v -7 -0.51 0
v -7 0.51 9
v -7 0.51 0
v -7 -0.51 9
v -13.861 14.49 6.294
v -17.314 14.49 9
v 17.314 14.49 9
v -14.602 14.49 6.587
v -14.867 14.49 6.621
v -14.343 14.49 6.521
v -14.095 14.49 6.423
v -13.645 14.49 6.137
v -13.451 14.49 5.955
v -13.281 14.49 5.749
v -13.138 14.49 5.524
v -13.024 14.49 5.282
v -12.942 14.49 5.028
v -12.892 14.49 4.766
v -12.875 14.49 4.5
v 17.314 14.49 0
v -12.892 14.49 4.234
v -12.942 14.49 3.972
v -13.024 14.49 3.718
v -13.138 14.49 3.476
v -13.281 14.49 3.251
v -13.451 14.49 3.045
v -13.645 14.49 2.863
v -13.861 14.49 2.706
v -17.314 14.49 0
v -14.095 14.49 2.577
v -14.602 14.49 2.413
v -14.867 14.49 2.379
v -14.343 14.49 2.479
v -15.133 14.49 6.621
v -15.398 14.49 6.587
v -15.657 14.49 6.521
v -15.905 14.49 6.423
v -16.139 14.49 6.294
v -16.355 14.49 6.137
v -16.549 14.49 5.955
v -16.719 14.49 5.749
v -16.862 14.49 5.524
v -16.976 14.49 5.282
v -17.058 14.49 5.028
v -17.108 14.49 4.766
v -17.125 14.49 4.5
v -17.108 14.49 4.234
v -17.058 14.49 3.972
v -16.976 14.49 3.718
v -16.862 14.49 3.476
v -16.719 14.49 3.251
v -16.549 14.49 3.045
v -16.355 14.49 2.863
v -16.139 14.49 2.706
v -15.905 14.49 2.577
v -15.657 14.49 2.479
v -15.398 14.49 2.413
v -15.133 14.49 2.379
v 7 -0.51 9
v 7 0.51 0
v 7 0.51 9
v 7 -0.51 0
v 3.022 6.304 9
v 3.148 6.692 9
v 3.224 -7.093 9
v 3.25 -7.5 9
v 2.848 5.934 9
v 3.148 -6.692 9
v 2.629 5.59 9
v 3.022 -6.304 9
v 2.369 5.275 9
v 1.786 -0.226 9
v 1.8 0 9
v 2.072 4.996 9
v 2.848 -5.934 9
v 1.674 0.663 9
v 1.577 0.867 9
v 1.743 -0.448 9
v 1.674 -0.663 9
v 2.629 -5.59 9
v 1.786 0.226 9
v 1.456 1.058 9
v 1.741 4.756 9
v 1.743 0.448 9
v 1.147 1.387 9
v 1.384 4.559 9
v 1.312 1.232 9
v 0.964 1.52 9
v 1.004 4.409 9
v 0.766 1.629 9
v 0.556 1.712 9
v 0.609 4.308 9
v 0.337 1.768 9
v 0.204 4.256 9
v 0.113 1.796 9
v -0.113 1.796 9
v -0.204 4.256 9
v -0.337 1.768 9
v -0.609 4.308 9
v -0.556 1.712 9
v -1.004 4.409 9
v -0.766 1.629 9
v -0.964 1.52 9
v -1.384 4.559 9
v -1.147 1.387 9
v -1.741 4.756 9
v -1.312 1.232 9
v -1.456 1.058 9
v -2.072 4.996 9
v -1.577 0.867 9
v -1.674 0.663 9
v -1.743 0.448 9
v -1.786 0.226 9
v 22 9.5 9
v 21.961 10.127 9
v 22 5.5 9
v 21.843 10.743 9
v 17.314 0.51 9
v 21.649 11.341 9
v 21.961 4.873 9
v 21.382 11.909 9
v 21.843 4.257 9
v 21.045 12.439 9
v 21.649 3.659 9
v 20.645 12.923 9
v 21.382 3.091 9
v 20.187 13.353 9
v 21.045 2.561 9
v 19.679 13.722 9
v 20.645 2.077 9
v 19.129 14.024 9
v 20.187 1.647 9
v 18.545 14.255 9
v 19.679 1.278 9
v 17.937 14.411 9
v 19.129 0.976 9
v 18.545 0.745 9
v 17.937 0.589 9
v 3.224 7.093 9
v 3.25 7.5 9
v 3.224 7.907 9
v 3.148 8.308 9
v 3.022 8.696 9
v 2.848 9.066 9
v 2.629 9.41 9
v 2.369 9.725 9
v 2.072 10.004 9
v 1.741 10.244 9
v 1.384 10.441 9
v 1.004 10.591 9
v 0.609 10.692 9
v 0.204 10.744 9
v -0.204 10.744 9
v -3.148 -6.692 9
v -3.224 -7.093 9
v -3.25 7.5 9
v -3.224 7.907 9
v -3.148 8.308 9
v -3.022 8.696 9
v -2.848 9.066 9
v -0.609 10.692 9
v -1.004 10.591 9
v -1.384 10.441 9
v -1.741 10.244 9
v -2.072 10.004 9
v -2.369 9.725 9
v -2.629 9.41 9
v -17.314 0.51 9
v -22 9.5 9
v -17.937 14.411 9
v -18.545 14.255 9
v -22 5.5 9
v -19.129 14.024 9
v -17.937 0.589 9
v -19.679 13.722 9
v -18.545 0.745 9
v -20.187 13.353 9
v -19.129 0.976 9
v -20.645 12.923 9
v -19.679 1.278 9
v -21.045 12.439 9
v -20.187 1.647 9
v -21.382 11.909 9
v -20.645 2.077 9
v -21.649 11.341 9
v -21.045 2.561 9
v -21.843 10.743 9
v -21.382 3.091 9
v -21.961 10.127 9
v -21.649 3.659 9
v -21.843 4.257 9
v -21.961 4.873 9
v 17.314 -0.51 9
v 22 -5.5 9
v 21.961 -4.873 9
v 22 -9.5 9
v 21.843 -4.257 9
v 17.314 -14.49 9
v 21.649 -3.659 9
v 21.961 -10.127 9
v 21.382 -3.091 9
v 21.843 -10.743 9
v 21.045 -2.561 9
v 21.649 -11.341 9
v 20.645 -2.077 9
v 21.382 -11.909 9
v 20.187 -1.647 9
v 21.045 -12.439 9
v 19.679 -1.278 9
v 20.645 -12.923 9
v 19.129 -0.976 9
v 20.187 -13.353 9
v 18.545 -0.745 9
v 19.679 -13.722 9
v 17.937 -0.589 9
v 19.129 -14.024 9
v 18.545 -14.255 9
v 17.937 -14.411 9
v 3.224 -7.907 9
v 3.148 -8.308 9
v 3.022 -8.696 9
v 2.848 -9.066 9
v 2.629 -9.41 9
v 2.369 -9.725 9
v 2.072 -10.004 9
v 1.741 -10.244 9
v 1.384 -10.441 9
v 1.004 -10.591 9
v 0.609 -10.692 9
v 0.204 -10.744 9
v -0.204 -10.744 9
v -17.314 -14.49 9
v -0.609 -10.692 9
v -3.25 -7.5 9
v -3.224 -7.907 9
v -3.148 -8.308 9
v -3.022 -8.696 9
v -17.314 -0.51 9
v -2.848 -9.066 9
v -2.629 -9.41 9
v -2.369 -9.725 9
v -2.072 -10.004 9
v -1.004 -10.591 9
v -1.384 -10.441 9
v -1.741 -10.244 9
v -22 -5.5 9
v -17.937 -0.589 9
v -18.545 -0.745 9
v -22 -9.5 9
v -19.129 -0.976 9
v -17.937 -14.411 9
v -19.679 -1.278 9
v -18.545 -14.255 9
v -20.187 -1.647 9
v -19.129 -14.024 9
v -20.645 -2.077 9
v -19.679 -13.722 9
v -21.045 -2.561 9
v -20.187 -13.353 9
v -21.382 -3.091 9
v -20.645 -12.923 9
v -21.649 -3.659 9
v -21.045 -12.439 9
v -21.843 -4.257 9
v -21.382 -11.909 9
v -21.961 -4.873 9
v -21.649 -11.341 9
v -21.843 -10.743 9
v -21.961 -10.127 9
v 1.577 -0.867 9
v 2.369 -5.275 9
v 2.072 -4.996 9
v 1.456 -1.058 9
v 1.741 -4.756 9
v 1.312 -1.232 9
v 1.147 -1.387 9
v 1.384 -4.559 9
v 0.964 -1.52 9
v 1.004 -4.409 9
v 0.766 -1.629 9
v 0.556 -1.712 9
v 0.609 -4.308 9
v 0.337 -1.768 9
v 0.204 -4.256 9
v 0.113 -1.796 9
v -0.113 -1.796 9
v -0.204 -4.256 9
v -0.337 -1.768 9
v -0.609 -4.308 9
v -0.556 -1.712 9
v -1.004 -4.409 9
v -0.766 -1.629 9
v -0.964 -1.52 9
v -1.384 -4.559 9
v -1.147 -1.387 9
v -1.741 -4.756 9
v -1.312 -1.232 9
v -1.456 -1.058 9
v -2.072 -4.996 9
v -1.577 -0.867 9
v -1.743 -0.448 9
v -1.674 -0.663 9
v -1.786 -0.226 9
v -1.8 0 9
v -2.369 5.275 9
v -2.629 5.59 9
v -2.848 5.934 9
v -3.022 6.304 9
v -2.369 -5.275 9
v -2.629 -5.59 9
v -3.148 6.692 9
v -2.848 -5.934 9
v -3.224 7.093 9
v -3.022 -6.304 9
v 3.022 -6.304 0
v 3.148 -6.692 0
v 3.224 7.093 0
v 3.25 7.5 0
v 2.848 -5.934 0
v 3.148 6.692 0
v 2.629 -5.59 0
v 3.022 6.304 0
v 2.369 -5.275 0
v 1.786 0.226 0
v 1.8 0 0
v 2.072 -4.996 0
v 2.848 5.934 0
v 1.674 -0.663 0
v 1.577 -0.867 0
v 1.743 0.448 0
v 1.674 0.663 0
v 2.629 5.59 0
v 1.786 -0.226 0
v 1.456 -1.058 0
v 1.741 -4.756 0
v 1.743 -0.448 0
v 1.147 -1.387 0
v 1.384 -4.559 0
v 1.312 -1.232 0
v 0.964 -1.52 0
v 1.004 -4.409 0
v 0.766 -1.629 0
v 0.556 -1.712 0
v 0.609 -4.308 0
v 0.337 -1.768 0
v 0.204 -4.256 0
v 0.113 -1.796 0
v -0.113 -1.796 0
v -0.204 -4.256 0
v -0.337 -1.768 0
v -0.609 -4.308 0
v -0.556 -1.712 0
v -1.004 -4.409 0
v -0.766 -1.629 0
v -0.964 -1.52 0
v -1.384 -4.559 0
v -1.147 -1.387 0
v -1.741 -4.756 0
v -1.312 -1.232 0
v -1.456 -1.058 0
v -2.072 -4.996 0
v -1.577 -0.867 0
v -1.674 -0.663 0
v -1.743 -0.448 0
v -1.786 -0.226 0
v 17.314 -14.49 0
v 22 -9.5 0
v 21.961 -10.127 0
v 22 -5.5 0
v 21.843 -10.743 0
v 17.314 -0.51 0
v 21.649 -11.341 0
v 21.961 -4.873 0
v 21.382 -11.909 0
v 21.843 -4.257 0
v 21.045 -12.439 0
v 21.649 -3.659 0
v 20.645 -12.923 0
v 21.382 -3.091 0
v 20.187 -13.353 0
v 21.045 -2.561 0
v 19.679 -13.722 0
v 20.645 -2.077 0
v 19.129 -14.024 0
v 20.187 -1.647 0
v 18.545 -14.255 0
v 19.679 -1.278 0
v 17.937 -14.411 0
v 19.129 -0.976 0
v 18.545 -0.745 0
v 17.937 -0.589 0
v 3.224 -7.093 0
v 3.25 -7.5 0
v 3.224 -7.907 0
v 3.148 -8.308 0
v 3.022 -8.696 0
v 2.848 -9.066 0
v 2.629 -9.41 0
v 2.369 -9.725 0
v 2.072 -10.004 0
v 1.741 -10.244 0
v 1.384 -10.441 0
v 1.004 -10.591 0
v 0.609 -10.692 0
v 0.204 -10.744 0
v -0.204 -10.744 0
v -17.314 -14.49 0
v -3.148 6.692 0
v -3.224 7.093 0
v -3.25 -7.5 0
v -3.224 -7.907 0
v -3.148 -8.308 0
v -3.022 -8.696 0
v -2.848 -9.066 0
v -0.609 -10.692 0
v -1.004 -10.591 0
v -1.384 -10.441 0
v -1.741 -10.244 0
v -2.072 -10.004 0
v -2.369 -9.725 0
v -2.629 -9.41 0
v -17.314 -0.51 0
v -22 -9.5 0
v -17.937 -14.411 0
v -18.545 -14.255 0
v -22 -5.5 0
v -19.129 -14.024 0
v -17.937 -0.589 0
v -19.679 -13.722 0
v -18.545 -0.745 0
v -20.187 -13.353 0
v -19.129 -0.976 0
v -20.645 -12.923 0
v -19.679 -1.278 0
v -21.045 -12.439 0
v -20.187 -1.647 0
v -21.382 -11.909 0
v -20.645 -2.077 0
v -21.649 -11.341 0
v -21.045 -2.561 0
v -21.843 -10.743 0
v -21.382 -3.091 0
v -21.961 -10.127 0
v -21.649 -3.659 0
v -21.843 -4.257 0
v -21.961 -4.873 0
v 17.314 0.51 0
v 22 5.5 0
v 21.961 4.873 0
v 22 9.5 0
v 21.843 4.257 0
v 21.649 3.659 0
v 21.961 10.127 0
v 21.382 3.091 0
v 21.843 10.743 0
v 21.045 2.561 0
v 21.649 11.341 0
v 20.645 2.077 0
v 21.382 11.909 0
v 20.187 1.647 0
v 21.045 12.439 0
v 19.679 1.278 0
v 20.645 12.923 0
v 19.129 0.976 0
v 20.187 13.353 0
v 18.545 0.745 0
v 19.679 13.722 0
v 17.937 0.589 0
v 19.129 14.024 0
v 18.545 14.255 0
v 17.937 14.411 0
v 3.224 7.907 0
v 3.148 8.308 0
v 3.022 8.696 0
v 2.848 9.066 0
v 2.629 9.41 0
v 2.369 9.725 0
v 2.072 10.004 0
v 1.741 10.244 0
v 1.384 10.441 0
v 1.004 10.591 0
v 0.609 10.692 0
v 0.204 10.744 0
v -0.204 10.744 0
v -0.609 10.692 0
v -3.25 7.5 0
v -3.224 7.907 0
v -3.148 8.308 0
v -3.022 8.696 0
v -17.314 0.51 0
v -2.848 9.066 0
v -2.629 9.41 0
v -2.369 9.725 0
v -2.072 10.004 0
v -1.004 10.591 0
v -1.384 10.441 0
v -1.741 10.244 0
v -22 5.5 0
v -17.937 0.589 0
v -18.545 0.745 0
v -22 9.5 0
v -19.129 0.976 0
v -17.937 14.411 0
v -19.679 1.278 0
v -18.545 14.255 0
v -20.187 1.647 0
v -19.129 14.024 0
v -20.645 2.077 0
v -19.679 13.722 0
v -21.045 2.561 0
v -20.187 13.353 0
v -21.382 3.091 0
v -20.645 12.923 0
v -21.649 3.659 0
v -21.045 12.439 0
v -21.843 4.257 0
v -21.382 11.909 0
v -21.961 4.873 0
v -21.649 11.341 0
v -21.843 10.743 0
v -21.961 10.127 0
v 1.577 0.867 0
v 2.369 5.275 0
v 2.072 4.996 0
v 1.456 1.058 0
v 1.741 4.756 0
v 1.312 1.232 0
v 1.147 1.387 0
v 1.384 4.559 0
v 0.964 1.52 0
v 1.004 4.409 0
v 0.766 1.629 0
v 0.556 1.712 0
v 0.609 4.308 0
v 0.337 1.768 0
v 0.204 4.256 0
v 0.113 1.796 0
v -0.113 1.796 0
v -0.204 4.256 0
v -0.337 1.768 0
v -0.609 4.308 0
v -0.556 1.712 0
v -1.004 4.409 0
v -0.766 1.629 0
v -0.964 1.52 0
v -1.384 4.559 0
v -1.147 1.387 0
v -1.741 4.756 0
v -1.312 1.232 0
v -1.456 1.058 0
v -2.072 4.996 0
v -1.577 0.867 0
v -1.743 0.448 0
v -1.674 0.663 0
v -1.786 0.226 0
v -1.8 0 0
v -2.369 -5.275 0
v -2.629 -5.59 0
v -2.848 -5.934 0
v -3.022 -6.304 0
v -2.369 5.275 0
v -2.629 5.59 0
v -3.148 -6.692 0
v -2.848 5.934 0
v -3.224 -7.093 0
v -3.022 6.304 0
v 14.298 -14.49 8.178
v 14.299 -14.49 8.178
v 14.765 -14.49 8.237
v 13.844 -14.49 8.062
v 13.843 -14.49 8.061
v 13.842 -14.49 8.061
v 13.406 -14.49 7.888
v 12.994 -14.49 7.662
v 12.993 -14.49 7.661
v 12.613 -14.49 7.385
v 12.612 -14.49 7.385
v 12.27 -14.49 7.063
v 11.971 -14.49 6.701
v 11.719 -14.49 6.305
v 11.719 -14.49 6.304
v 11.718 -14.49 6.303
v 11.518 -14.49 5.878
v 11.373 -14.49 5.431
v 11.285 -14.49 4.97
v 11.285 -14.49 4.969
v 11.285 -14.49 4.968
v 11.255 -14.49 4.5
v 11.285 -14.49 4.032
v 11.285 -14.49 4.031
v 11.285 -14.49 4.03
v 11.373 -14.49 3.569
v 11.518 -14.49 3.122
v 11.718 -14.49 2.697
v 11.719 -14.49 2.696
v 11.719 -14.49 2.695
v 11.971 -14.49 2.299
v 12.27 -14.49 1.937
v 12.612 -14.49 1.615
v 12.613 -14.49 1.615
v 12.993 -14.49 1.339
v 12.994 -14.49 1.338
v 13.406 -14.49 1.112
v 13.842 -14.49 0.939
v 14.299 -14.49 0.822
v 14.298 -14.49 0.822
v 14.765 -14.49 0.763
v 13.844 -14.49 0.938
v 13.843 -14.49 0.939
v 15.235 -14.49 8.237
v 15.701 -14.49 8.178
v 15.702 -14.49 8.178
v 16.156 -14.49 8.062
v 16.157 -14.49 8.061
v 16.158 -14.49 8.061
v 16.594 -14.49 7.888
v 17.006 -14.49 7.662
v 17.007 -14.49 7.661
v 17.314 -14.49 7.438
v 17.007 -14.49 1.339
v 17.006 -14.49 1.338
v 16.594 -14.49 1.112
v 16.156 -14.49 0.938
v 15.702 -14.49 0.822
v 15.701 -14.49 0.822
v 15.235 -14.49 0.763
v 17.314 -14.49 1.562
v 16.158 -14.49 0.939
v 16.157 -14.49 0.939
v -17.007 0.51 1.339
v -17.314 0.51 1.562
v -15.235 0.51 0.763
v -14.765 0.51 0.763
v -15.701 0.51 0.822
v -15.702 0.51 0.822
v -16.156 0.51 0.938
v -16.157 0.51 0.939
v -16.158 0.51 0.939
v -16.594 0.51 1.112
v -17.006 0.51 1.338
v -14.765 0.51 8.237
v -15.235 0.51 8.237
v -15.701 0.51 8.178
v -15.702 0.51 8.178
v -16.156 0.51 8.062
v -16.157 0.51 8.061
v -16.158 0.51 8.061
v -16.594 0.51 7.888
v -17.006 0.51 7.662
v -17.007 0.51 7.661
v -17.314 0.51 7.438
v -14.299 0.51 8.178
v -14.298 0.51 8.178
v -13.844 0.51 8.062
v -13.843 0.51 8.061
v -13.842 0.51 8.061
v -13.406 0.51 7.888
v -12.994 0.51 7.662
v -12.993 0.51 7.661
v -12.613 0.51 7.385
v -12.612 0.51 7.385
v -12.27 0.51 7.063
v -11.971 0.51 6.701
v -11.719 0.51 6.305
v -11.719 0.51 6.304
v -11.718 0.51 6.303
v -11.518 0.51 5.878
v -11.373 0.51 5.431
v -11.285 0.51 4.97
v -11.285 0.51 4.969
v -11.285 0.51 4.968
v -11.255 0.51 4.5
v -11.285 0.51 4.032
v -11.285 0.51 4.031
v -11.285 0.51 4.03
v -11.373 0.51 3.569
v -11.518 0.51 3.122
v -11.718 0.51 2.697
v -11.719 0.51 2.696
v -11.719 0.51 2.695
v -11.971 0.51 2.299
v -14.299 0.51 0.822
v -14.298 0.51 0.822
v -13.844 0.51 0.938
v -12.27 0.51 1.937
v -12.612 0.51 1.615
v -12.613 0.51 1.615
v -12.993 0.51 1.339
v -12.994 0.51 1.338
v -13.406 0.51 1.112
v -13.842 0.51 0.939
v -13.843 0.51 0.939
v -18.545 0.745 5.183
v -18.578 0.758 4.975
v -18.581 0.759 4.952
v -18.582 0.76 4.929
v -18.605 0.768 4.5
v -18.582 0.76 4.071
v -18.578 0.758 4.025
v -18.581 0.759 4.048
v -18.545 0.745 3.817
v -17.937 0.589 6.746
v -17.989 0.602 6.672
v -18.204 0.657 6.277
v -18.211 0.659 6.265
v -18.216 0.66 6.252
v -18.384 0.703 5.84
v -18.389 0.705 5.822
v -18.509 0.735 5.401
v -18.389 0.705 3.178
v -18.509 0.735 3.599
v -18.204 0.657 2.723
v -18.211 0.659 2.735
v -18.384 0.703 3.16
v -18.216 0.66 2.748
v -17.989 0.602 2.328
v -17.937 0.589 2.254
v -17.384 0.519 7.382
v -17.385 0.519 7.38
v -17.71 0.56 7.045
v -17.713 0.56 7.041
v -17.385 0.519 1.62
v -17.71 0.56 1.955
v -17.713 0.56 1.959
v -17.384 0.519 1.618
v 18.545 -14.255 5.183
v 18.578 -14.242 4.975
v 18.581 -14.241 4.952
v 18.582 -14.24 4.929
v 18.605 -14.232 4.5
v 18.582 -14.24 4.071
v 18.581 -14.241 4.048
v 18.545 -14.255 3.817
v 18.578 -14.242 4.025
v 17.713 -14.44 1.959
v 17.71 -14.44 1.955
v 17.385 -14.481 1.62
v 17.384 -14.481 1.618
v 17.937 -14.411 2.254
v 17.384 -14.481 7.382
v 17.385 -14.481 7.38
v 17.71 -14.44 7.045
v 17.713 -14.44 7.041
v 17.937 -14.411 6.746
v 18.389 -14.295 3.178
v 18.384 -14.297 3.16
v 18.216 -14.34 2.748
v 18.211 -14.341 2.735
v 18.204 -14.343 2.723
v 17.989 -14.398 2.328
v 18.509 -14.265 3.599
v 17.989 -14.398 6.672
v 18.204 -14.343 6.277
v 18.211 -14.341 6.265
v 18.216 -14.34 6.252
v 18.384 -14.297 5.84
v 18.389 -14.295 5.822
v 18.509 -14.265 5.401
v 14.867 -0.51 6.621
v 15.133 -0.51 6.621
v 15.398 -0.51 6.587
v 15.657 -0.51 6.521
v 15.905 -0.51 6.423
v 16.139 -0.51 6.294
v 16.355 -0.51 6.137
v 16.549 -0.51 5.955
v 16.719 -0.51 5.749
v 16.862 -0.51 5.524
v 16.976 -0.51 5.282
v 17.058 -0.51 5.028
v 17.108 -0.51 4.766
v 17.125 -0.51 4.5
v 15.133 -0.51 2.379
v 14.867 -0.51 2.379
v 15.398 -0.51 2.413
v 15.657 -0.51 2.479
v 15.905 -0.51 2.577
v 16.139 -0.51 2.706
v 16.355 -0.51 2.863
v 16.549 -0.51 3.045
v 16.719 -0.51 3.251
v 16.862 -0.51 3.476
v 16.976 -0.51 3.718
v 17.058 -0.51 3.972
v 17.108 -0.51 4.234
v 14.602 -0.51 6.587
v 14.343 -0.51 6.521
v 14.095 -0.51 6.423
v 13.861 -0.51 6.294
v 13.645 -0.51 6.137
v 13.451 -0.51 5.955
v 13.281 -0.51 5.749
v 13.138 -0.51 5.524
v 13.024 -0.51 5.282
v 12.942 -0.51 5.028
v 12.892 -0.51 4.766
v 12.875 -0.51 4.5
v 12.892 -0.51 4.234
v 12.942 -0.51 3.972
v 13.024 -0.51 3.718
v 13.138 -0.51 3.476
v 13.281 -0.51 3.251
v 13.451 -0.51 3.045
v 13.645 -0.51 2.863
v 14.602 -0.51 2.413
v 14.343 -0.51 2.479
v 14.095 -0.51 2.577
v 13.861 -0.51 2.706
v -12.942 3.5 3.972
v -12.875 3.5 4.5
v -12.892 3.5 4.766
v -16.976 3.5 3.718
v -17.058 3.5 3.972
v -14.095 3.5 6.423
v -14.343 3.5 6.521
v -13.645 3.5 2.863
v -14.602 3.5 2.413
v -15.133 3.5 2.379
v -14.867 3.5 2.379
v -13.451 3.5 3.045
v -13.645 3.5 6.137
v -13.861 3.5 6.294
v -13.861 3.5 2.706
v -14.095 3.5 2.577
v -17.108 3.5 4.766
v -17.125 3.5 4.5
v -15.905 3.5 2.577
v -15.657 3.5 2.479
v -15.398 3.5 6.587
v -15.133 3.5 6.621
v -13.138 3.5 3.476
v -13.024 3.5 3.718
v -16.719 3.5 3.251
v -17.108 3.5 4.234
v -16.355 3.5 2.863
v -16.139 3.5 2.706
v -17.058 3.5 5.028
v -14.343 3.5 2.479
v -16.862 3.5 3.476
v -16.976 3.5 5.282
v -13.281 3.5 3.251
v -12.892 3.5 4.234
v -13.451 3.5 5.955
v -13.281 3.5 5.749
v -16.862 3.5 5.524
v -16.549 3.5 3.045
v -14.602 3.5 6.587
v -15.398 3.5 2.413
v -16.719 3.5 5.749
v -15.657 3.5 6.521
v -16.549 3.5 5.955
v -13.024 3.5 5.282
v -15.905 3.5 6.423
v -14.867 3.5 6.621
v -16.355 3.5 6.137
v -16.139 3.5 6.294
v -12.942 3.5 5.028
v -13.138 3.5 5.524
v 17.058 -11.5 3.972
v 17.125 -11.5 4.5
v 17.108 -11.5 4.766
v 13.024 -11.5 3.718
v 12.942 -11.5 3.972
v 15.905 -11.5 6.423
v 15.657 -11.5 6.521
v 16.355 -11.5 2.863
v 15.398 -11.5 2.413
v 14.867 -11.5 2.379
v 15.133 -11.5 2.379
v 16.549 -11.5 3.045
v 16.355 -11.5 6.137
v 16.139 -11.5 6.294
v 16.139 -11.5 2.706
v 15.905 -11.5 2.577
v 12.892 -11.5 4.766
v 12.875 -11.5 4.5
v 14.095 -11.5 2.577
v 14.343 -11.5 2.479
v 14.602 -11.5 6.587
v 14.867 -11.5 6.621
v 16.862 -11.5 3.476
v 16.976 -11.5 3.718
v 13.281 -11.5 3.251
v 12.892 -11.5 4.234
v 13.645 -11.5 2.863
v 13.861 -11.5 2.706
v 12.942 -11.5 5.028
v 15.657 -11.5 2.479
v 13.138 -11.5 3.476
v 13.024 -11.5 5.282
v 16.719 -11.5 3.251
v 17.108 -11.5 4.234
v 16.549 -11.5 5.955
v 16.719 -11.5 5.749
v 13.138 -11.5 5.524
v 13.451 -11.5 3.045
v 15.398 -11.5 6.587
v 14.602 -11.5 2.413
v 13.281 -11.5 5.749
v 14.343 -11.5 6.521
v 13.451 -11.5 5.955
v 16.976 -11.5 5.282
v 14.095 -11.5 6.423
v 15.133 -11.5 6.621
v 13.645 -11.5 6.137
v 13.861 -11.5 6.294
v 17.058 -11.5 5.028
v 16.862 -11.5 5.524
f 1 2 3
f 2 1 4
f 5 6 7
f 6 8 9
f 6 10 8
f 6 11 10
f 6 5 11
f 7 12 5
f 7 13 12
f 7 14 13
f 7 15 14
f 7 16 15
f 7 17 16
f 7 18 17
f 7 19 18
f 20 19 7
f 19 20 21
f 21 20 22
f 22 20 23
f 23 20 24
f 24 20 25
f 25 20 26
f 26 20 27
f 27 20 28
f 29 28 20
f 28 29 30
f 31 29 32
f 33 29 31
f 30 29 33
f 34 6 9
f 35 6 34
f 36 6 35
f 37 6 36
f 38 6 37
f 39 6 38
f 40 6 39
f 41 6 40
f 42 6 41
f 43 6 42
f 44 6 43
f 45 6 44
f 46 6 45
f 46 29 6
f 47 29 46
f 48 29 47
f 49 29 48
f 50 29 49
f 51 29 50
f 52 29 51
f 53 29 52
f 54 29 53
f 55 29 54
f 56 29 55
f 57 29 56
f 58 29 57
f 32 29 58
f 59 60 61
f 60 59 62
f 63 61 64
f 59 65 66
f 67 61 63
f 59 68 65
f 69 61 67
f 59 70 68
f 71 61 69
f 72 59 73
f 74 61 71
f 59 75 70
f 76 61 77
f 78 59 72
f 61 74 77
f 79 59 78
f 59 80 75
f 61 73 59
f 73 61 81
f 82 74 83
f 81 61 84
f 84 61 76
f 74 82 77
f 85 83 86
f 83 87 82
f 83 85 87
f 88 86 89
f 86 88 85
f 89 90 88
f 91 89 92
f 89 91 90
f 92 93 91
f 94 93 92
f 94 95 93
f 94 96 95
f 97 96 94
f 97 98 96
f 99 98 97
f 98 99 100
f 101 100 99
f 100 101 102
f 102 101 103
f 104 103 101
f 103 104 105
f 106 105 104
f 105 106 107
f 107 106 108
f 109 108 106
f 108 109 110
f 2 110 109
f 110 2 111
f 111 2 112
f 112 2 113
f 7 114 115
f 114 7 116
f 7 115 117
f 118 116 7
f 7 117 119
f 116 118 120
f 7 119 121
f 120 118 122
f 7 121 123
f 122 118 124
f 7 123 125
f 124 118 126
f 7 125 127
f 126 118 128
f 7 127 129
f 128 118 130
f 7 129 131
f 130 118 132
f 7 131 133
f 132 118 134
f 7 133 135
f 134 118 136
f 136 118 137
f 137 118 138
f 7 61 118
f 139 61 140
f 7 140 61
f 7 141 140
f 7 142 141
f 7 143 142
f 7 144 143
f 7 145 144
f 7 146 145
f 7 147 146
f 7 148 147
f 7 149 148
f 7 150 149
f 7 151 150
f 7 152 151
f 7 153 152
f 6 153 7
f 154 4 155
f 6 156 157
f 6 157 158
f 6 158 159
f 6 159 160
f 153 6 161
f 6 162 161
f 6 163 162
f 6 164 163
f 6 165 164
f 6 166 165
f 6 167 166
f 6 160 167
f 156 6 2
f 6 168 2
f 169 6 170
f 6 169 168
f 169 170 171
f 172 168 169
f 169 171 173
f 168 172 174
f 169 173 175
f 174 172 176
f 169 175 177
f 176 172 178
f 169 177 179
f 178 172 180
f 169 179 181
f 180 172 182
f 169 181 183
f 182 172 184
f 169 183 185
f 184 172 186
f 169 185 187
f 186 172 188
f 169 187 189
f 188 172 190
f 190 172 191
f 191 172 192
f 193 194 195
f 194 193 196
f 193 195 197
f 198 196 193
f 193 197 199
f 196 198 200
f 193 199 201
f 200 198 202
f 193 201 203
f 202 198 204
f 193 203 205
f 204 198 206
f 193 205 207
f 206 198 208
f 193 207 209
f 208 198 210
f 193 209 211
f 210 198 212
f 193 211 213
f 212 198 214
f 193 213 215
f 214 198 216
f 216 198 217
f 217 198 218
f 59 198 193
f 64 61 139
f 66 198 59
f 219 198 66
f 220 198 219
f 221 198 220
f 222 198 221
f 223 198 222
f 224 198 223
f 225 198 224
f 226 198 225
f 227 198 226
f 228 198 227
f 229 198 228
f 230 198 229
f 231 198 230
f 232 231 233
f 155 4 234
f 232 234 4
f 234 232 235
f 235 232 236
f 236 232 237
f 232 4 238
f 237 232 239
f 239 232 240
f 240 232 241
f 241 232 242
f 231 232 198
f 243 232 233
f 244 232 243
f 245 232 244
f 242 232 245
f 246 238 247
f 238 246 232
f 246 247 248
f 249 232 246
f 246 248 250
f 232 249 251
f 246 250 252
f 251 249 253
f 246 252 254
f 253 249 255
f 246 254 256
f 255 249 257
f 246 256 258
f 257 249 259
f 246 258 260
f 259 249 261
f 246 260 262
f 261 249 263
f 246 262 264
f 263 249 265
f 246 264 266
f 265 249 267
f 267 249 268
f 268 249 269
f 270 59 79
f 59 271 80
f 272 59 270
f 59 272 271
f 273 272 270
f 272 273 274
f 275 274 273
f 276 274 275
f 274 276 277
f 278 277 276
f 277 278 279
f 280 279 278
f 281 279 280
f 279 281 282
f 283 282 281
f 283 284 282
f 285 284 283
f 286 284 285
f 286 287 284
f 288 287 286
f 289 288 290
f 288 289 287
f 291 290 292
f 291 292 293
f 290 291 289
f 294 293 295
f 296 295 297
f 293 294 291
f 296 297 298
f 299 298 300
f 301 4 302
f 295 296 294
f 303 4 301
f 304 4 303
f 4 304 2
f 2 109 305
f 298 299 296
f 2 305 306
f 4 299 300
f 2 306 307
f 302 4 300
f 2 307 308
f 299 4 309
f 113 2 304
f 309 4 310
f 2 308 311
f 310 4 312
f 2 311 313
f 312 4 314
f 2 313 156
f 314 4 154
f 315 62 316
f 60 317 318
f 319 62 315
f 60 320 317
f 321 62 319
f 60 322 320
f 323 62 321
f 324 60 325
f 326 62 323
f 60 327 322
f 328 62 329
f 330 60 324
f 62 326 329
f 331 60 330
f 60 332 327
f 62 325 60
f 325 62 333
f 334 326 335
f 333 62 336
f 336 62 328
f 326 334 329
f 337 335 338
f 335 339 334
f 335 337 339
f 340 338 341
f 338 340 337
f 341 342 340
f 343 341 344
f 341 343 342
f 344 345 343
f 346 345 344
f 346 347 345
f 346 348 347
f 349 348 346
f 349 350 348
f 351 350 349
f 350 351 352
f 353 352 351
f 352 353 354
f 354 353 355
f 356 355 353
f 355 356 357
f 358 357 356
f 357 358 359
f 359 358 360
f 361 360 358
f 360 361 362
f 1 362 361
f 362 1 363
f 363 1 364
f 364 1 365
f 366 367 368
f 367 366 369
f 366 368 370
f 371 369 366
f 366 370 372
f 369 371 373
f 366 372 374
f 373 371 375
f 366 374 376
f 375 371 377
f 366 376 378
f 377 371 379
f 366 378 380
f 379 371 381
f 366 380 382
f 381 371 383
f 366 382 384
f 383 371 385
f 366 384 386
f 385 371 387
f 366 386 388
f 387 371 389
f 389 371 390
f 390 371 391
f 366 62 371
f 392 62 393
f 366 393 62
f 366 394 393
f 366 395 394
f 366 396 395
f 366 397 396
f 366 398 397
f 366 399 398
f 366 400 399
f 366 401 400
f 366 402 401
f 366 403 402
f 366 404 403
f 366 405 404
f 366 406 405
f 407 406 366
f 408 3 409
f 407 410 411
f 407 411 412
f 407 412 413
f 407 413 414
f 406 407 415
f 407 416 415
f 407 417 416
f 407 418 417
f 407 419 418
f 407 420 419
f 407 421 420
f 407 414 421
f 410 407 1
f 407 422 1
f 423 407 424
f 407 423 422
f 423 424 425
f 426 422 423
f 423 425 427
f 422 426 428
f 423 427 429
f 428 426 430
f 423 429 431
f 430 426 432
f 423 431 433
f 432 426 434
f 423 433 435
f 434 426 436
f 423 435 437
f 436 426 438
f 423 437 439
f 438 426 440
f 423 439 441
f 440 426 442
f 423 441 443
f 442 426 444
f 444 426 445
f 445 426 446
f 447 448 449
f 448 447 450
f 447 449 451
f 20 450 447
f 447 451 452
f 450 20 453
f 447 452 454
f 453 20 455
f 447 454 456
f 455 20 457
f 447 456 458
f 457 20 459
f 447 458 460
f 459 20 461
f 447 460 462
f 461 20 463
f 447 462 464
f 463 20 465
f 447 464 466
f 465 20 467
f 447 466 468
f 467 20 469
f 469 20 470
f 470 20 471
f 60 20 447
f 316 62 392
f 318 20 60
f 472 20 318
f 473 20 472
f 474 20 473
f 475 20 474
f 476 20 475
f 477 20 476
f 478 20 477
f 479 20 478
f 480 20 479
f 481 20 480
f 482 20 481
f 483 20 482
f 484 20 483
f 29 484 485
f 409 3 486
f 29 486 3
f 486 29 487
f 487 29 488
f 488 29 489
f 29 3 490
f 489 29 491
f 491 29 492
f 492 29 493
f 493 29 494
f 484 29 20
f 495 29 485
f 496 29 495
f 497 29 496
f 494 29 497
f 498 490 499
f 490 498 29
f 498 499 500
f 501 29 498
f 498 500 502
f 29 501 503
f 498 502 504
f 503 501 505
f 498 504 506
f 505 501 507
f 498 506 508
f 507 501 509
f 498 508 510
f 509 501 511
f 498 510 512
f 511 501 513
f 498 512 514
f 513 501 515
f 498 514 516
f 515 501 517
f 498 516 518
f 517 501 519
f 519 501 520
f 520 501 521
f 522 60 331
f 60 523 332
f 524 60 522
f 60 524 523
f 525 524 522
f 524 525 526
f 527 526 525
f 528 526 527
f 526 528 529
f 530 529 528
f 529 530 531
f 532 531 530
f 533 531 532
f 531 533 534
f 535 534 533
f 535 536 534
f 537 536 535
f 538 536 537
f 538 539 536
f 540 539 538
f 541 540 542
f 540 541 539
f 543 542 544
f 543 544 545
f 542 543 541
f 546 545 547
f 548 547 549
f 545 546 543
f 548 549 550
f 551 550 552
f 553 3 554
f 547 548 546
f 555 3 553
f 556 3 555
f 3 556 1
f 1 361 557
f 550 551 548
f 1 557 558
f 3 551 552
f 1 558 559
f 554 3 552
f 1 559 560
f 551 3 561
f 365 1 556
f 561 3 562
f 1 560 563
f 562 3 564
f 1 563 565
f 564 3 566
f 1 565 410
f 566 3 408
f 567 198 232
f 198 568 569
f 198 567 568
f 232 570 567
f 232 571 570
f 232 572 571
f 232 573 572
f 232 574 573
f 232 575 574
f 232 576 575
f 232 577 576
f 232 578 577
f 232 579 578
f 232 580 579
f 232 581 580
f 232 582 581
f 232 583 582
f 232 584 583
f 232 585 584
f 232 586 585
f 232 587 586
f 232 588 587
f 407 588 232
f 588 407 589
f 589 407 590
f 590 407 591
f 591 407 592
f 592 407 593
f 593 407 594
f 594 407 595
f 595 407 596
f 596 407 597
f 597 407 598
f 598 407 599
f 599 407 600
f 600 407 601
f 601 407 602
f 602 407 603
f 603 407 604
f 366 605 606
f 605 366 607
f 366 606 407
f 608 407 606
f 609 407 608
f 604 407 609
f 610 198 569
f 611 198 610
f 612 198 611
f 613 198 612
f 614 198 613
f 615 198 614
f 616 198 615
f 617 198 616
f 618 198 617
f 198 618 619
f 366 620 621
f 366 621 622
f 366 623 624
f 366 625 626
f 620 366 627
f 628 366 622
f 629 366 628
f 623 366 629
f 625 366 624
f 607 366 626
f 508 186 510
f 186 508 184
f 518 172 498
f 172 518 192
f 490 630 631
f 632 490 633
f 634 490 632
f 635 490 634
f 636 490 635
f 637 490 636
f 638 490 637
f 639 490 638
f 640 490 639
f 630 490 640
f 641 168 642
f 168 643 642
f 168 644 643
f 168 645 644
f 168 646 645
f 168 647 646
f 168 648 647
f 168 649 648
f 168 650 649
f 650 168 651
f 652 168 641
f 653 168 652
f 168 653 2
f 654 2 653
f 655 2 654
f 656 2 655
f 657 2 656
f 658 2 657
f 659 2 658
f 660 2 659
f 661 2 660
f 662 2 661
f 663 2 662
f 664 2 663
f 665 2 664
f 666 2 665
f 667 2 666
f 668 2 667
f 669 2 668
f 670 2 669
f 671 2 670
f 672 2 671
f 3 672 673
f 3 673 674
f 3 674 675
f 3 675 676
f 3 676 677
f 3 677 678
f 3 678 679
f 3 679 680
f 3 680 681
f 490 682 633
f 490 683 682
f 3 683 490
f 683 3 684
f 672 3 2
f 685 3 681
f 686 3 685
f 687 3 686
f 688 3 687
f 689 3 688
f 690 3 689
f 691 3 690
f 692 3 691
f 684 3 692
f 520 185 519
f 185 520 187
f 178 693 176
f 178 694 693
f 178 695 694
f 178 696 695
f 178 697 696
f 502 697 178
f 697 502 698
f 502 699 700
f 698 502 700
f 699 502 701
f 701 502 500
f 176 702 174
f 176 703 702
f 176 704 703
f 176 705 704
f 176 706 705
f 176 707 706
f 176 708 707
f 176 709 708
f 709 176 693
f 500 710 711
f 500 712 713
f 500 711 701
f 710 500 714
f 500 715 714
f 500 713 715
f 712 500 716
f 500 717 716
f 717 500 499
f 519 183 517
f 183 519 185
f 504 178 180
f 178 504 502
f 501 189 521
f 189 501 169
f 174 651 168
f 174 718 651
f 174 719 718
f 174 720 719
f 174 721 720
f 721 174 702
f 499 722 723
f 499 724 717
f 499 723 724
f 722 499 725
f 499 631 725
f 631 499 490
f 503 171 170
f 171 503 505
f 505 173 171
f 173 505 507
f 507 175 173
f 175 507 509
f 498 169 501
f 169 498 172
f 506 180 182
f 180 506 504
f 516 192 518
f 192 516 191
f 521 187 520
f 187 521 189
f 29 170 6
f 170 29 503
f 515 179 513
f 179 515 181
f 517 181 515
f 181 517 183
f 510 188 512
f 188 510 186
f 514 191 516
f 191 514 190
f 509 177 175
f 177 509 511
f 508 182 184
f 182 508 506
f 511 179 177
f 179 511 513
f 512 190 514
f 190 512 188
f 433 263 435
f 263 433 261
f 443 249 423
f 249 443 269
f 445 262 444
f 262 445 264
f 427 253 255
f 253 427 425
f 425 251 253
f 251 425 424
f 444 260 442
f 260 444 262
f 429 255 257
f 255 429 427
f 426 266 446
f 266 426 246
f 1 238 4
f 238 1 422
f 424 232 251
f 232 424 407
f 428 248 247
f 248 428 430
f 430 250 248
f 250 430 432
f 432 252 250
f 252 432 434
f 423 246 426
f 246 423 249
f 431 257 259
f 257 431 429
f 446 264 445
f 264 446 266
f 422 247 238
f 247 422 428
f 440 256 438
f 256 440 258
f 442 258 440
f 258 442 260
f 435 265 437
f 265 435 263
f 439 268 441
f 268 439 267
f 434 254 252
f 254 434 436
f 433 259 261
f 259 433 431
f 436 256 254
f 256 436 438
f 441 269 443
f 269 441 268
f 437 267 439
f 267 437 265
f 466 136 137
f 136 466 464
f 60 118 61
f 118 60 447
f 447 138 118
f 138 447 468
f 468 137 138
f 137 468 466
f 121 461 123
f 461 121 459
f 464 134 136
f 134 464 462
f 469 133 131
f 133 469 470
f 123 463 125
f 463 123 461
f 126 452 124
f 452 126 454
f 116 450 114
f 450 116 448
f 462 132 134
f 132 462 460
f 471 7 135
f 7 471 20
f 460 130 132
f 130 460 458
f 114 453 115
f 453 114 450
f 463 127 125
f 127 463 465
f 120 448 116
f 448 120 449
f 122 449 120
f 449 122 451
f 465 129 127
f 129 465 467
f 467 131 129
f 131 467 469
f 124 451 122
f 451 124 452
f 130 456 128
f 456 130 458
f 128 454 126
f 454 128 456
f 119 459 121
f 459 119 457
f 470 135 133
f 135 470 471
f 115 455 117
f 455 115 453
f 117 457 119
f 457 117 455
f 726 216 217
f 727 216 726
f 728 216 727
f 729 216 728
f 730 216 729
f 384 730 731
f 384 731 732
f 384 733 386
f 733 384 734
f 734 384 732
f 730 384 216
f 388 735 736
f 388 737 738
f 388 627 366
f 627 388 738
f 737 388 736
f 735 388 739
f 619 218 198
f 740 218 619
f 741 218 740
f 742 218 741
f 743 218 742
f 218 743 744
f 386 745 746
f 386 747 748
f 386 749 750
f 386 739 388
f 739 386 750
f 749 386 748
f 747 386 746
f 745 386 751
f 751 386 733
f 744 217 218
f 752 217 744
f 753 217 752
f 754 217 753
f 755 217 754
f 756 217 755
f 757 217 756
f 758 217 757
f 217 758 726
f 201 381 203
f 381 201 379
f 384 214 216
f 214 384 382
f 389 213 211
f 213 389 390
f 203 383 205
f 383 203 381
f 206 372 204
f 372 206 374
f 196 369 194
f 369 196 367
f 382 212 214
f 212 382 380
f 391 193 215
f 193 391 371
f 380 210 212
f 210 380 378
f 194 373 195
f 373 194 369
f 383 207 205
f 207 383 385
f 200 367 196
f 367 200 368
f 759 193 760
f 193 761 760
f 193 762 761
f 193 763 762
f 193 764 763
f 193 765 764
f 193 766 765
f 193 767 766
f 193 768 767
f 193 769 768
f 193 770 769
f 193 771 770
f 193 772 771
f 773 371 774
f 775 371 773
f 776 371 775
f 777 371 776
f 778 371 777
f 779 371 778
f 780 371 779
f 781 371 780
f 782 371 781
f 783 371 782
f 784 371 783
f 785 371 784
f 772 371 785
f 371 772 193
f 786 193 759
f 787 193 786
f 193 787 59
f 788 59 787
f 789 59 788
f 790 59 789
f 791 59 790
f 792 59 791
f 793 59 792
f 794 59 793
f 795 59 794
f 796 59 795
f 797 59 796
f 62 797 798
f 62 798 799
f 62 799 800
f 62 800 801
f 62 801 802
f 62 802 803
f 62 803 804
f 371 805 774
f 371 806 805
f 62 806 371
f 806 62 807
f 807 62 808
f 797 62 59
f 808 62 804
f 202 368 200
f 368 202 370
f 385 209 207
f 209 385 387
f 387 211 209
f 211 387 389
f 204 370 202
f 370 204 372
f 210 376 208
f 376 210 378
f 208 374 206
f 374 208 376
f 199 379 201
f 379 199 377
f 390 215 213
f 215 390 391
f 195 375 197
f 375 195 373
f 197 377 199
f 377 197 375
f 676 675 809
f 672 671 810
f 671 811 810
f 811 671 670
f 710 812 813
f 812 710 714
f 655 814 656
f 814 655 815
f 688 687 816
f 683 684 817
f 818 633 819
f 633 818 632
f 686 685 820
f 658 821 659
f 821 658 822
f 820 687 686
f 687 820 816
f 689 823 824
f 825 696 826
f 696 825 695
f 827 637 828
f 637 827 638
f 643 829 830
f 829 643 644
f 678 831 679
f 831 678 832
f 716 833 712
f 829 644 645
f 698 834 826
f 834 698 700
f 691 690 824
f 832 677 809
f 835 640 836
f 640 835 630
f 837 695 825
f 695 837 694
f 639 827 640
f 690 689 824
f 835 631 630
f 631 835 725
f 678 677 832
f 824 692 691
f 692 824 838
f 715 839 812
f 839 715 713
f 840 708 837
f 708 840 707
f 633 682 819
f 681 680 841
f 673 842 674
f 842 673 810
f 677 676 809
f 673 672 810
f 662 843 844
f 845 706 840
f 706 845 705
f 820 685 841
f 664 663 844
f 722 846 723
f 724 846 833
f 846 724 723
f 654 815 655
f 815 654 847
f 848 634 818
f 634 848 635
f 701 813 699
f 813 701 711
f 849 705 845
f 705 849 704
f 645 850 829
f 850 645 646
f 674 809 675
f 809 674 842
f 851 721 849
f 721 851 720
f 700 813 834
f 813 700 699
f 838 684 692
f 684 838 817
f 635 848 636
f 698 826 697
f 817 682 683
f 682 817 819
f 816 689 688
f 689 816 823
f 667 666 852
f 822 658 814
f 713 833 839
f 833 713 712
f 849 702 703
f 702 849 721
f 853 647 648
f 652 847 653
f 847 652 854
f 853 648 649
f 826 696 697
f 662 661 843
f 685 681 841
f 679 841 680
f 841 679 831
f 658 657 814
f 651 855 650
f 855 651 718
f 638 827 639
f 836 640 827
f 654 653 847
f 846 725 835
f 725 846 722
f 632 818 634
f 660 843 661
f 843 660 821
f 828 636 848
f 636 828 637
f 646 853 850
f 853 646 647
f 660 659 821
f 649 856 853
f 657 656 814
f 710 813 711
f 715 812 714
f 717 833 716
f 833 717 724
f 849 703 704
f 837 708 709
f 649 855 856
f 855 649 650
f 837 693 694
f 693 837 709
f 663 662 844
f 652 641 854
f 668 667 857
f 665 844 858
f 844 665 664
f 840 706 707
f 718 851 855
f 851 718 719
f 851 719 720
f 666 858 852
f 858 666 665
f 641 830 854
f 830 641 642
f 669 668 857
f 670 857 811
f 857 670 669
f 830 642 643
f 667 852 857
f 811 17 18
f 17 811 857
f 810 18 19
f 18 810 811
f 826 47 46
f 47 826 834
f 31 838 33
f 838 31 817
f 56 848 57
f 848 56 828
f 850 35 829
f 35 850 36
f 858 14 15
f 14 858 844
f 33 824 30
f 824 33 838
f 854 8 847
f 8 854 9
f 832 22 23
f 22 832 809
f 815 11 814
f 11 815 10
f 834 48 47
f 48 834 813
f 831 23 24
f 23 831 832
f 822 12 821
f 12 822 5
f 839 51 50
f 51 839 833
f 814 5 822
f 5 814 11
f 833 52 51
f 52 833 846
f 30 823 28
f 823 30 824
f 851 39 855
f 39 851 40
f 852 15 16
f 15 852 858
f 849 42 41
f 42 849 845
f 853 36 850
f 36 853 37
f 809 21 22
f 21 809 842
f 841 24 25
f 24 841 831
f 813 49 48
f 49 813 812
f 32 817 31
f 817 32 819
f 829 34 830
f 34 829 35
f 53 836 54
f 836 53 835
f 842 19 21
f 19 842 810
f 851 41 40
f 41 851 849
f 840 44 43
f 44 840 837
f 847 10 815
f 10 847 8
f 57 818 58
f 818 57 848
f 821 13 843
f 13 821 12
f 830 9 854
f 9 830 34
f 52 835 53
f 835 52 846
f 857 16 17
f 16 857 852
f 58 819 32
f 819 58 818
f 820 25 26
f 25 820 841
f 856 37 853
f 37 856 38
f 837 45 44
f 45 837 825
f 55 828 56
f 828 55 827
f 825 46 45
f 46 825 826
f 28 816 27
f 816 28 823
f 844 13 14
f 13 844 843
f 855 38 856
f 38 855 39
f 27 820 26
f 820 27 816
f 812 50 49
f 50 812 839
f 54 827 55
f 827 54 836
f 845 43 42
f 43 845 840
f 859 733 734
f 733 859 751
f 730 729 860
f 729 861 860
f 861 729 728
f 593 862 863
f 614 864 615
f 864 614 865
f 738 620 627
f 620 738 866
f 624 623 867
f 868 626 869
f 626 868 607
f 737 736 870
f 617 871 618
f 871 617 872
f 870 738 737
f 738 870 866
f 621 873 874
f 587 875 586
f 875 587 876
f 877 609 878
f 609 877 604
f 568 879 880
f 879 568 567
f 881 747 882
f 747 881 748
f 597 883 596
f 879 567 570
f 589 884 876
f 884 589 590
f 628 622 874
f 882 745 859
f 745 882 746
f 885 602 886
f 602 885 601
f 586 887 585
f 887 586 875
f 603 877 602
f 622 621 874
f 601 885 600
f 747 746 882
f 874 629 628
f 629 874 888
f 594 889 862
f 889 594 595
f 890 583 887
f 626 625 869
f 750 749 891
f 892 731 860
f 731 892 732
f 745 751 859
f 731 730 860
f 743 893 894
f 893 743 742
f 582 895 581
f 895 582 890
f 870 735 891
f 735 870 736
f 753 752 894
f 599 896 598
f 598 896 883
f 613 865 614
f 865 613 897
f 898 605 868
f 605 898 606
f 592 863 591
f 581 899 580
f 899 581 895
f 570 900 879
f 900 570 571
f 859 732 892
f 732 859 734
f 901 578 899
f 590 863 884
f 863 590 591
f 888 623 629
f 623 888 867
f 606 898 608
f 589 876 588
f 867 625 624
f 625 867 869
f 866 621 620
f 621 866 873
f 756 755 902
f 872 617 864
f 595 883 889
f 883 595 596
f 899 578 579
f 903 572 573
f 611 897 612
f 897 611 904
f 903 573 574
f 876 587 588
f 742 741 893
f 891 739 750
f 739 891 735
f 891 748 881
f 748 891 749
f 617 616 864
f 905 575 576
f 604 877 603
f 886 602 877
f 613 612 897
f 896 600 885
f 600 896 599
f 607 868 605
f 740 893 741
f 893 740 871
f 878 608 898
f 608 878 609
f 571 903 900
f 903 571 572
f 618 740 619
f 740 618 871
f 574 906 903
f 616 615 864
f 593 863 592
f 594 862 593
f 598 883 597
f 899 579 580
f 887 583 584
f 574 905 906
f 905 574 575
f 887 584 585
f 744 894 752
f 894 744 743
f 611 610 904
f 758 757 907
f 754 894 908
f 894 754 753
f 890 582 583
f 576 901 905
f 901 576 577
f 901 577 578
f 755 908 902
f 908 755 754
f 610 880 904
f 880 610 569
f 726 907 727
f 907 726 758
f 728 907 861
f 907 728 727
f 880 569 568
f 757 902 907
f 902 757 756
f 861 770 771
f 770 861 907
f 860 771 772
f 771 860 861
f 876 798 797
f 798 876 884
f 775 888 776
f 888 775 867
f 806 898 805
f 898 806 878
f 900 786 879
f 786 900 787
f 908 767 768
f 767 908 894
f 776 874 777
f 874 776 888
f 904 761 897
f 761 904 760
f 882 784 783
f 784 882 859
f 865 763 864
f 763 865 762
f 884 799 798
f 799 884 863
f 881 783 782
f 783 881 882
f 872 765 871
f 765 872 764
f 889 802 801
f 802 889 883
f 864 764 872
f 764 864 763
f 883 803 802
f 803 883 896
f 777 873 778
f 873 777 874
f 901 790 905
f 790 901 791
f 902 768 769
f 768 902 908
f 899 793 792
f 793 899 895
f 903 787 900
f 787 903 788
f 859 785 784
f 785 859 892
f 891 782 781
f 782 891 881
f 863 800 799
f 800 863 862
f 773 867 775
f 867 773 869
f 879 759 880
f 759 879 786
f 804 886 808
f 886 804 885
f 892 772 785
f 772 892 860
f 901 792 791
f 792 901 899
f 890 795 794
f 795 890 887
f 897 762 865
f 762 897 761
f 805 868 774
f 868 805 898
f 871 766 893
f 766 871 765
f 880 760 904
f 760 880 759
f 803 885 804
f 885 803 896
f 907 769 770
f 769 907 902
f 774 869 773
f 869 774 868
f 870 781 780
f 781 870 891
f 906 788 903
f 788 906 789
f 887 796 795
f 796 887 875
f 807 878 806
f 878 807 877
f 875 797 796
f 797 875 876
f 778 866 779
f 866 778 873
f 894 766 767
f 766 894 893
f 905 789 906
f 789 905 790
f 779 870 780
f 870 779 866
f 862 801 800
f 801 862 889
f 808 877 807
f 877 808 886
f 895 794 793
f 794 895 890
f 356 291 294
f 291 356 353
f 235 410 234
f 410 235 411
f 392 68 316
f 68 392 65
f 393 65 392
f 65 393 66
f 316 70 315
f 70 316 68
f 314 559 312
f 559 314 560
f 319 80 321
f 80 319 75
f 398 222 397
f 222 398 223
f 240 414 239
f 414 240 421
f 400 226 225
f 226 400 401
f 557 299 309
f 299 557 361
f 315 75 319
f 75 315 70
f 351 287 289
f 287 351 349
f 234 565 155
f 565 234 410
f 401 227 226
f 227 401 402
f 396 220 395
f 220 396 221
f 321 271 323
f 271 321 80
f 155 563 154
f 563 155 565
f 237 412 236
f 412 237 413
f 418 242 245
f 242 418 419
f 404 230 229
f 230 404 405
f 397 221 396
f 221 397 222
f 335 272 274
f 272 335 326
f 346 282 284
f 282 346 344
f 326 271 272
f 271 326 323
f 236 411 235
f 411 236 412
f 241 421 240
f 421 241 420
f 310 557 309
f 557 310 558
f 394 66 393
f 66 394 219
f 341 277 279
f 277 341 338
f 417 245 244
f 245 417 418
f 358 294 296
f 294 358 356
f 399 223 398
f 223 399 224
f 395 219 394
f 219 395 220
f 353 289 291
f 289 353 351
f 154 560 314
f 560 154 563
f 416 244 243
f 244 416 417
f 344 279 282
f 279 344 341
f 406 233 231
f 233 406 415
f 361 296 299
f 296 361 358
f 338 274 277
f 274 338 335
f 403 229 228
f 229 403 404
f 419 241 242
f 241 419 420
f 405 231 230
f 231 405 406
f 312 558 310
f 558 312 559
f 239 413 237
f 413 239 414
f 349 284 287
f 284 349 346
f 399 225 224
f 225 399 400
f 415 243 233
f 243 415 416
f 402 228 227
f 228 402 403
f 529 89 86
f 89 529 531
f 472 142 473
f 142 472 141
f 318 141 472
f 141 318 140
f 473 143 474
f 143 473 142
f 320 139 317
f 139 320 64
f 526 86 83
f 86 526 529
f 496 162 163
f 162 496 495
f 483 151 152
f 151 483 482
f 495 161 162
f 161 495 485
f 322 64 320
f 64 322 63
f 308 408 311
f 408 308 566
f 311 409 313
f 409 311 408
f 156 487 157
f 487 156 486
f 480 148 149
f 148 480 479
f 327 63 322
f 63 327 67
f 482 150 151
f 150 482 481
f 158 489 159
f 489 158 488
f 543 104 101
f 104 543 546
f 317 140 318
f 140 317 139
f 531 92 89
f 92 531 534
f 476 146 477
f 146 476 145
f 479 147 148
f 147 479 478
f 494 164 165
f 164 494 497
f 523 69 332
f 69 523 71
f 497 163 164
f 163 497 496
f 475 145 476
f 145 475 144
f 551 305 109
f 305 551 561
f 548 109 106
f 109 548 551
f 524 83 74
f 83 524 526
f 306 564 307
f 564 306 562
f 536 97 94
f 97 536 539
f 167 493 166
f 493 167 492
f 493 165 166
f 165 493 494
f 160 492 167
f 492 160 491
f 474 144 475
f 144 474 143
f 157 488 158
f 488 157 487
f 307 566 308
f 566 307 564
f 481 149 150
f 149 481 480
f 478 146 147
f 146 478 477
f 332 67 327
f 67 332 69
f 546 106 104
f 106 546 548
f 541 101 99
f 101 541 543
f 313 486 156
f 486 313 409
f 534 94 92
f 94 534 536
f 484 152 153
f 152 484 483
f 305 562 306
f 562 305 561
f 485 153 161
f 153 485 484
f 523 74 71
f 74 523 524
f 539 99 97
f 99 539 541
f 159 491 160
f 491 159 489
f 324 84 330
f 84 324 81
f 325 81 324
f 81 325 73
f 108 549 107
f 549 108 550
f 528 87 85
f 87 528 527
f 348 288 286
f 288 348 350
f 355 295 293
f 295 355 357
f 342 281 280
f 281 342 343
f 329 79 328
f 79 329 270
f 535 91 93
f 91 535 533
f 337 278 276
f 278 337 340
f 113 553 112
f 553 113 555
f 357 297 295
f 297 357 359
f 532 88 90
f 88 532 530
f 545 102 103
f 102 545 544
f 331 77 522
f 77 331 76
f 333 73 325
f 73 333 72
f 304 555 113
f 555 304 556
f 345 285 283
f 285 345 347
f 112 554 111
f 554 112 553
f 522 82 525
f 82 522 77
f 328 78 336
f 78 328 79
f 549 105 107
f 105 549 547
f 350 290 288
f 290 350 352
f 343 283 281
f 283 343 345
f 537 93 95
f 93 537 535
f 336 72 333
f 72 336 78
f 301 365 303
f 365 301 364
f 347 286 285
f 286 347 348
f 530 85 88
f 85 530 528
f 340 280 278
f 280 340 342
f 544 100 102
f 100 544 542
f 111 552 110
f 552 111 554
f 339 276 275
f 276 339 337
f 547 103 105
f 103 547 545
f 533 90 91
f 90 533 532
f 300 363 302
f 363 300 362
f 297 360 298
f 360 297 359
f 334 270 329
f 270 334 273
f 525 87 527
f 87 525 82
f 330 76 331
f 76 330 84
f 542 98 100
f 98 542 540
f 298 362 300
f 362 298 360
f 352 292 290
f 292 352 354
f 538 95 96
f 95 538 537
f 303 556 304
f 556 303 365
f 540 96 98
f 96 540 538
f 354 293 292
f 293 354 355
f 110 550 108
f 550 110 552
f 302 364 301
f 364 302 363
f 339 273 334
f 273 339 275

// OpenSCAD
$fn = 50;


difference() {
	union() {
		hull() {
			translate(v = [-2.0000000000, 9.5000000000, 0]) {
				cylinder(h = 9, r = 5);
			}
			translate(v = [2.0000000000, 9.5000000000, 0]) {
				cylinder(h = 9, r = 5);
			}
			translate(v = [-2.0000000000, -9.5000000000, 0]) {
				cylinder(h = 9, r = 5);
			}
			translate(v = [2.0000000000, -9.5000000000, 0]) {
				cylinder(h = 9, r = 5);
			}
		}
		translate(v = [-7.5000000000, 7.5000000000, 0]) {
			hull() {
				translate(v = [-9.5000000000, 2.0000000000, 0]) {
					cylinder(h = 9, r = 5);
				}
				translate(v = [9.5000000000, 2.0000000000, 0]) {
					cylinder(h = 9, r = 5);
				}
				translate(v = [-9.5000000000, -2.0000000000, 0]) {
					cylinder(h = 9, r = 5);
				}
				translate(v = [9.5000000000, -2.0000000000, 0]) {
					cylinder(h = 9, r = 5);
				}
			}
		}
		translate(v = [-7.5000000000, -7.5000000000, 0]) {
			hull() {
				translate(v = [-9.5000000000, 2.0000000000, 0]) {
					cylinder(h = 9, r = 5);
				}
				translate(v = [9.5000000000, 2.0000000000, 0]) {
					cylinder(h = 9, r = 5);
				}
				translate(v = [-9.5000000000, -2.0000000000, 0]) {
					cylinder(h = 9, r = 5);
				}
				translate(v = [9.5000000000, -2.0000000000, 0]) {
					cylinder(h = 9, r = 5);
				}
			}
		}
		translate(v = [7.5000000000, 7.5000000000, 0]) {
			hull() {
				translate(v = [-9.5000000000, 2.0000000000, 0]) {
					cylinder(h = 9, r = 5);
				}
				translate(v = [9.5000000000, 2.0000000000, 0]) {
					cylinder(h = 9, r = 5);
				}
				translate(v = [-9.5000000000, -2.0000000000, 0]) {
					cylinder(h = 9, r = 5);
				}
				translate(v = [9.5000000000, -2.0000000000, 0]) {
					cylinder(h = 9, r = 5);
				}
			}
		}
		translate(v = [7.5000000000, -7.5000000000, 0]) {
			hull() {
				translate(v = [-9.5000000000, 2.0000000000, 0]) {
					cylinder(h = 9, r = 5);
				}
				translate(v = [9.5000000000, 2.0000000000, 0]) {
					cylinder(h = 9, r = 5);
				}
				translate(v = [-9.5000000000, -2.0000000000, 0]) {
					cylinder(h = 9, r = 5);
				}
				translate(v = [9.5000000000, -2.0000000000, 0]) {
					cylinder(h = 9, r = 5);
				}
			}
		}
	}
	union() {
		translate(v = [-15.0000000000, 0.5000000000, 4.5000000000]) {
			rotate(a = [90, 0, 0]) {
				difference() {
					union() {
						#translate(v = [0, 0, -14.0000000000]) {
							cylinder(h = 14, r = 2.0000000000);
						}
						#translate(v = [0, 0, -3]) {
							cylinder(h = 3, r1 = 2.1250000000, r2 = 3.7500000000);
						}
						#translate(v = [0, 0, -14.0000000000]) {
							cylinder(h = 14, r = 2.1250000000);
						}
						#translate(v = [0, 0, -14.0000000000]) {
							cylinder(h = 14, r = 2.0000000000);
						}
					}
					union();
				}
			}
		}
		translate(v = [15.0000000000, -14.5000000000, 4.5000000000]) {
			rotate(a = [90, 0, 0]) {
				difference() {
					union() {
						#translate(v = [0, 0, -14.0000000000]) {
							cylinder(h = 14, r = 2.0000000000);
						}
						#translate(v = [0, 0, -3]) {
							cylinder(h = 3, r1 = 2.1250000000, r2 = 3.7500000000);
						}
						#translate(v = [0, 0, -14.0000000000]) {
							cylinder(h = 14, r = 2.1250000000);
						}
						#translate(v = [0, 0, -14.0000000000]) {
							cylinder(h = 14, r = 2.0000000000);
						}
					}
					union();
				}
			}
		}
		translate(v = [0.0000000000, -7.5000000000, 0]) {
			translate(v = [0, 0, -100]) {
				cylinder(h = 200, r = 3.2500000000);
			}
		}
		translate(v = [0.0000000000, 7.5000000000, 0]) {
			translate(v = [0, 0, -100]) {
				cylinder(h = 200, r = 3.2500000000);
			}
		}
		translate(v = [0.0000000000, -7.5000000000, 0]) {
			translate(v = [0, 0, -100]) {
				cylinder(h = 200, r = 1.8000000000);
			}
		}
		translate(v = [0, 0, -100]) {
			cylinder(h = 200, r = 1.8000000000);
		}
		translate(v = [0.0000000000, 7.5000000000, 0]) {
			translate(v = [0, 0, -100]) {
				cylinder(h = 200, r = 1.8000000000);
			}
		}
	}
}
